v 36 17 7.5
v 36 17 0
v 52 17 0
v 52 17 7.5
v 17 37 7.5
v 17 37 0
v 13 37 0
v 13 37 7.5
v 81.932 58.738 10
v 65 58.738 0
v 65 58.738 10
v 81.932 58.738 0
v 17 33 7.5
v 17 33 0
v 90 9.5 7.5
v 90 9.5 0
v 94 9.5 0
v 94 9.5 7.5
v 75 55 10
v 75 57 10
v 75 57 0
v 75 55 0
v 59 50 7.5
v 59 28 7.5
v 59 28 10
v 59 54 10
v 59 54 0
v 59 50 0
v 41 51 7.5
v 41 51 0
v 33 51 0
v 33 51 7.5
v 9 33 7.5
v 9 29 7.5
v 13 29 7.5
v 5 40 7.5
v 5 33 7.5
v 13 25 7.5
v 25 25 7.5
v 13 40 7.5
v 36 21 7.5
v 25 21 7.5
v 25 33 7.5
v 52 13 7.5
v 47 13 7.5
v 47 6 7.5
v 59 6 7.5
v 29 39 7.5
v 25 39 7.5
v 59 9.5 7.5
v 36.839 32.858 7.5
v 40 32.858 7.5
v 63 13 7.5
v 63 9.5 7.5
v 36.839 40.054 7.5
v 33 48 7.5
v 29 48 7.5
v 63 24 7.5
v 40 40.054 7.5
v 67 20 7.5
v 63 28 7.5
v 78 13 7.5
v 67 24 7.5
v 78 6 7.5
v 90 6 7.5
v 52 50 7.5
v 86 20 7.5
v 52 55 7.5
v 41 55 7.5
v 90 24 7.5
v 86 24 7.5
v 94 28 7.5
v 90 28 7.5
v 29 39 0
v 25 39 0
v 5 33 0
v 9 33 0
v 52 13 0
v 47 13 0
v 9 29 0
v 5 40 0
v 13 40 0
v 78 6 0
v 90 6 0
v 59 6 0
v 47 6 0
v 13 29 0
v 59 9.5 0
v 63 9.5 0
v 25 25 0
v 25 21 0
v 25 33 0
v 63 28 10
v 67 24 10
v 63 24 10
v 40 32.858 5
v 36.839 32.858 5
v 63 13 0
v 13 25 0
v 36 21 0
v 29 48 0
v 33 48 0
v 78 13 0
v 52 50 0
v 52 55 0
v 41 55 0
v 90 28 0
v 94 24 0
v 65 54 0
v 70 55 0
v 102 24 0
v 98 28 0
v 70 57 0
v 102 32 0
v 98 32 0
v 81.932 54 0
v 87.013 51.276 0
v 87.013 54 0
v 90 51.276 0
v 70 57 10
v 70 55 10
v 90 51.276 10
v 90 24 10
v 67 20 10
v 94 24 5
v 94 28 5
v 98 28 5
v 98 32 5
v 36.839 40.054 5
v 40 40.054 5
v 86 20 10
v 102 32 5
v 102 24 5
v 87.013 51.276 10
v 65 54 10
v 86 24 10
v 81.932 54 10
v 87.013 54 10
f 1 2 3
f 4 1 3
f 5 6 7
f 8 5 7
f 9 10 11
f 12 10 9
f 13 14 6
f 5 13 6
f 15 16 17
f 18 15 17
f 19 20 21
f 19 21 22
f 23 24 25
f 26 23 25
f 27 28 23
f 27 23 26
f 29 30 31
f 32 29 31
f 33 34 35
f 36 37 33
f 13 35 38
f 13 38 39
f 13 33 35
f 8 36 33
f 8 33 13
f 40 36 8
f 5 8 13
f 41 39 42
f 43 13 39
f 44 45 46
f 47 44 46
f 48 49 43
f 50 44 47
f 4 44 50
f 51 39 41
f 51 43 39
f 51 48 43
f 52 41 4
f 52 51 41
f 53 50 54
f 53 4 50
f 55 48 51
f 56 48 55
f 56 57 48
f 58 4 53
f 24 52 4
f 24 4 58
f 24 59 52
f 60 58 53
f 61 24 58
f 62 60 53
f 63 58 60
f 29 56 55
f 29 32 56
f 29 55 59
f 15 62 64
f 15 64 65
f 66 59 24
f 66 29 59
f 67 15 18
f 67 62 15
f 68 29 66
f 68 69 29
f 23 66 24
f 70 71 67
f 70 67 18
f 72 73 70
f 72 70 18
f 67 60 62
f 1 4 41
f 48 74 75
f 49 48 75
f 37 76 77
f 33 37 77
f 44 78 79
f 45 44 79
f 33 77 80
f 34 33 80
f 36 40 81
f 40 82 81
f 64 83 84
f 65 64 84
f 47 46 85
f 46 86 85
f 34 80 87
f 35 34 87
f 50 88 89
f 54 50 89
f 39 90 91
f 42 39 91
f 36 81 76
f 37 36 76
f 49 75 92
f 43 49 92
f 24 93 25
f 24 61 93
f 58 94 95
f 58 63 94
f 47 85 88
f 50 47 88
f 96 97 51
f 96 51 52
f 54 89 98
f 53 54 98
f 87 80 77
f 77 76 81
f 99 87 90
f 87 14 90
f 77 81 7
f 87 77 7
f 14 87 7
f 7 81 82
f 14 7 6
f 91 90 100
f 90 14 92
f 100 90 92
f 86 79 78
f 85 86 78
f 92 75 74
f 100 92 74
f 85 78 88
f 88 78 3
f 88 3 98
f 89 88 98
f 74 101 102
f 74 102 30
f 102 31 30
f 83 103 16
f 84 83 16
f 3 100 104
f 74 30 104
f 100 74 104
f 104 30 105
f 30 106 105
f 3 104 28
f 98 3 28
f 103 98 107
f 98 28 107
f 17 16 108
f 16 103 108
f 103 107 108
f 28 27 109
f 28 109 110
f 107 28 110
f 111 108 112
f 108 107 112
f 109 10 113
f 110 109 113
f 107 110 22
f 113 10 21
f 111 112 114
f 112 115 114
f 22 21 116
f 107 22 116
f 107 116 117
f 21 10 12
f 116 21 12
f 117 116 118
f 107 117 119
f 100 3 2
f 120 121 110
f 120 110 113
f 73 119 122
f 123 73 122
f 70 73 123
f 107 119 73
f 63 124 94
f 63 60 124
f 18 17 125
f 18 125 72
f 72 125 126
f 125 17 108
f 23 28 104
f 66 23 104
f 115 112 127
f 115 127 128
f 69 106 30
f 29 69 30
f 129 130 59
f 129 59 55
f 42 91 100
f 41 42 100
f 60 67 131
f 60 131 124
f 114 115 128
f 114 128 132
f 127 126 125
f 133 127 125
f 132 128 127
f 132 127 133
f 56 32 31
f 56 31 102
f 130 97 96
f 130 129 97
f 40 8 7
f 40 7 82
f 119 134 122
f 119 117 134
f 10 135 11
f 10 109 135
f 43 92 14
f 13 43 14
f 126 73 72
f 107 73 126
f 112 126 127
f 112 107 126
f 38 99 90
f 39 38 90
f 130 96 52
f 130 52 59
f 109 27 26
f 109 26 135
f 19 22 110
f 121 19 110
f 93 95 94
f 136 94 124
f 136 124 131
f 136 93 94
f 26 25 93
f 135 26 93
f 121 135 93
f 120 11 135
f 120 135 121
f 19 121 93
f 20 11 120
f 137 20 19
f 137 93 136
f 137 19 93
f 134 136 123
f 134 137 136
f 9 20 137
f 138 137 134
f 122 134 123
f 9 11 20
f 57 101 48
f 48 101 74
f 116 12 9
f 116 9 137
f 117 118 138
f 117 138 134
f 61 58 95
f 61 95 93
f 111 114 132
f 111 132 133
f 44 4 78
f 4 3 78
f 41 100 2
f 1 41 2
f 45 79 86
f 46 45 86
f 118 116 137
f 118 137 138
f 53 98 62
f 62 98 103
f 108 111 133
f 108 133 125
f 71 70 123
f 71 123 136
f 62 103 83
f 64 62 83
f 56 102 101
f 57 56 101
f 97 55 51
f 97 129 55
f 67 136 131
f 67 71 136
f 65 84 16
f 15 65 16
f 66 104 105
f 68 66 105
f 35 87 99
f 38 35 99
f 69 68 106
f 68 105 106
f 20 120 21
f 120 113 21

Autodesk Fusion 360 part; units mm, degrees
sketch "elephant sketch" plane through (0, 0, 0) normal (0, 0, 1) x (1, 0, 0)
  line L0 (5, 40) -> (5, 33)
  line L1 (5, 33) -> (9, 33)
  line L2 (9, 33) -> (9, 29)
  line L3 (9, 29) -> (13, 29)
  line L4 (13, 29) -> (13, 25)
  line L5 (13, 25) -> (25, 25)
  line L6 (25, 25) -> (25, 21)
  line L7 (25, 21) -> (36, 21)
  line L8 (36, 21) -> (36, 17)
  line L9 (36, 17) -> (52, 17)
  line L10 (52, 17) -> (52, 13)
  line L11 (52, 13) -> (47, 13)
  line L12 (47, 13) -> (47, 6)
  line L13 (47, 6) -> (59, 6)
  line L14 (59, 6) -> (59, 9.5)
  line L15 (59, 9.5) -> (63, 9.5)
  line L16 (63, 9.5) -> (63, 13)
  line L17 (63, 13) -> (78, 13)
  line L18 (78, 13) -> (78, 6)
  line L19 (78, 6) -> (90, 6)
  line L20 (90, 6) -> (90, 9.5)
  line L21 (90, 9.5) -> (94, 9.5)
  line L22 (94, 9.5) -> (94, 28)
  line L23 (94, 28) -> (90, 28)
  line L24 (90, 28) -> (90, 24)
  line L25 (90, 24) -> (86, 24)
  line L26 (86, 24) -> (86, 20)
  line L27 (86, 20) -> (67, 20)
  line L28 (67, 20) -> (67, 24)
  line L29 (67, 24) -> (63, 24)
  line L30 (63, 24) -> (63, 28)
  line L31 (63, 28) -> (59, 28)
  line L32 (59, 28) -> (59, 50)
  line L33 (59, 50) -> (52, 50)
  line L34 (52, 50) -> (52, 55)
  line L35 (52, 55) -> (41, 55)
  line L36 (41, 55) -> (41, 51)
  line L37 (41, 51) -> (33, 51)
  line L38 (33, 51) -> (33, 48)
  line L39 (33, 48) -> (29, 48)
  line L40 (29, 48) -> (29, 39)
  line L41 (29, 39) -> (25, 39)
  line L42 (25, 39) -> (25, 33)
  line L43 (25, 33) -> (17, 33)
  line L44 (17, 33) -> (17, 37)
  line L45 (17, 37) -> (13, 37)
  line L46 (13, 37) -> (13, 40)
  line L47 (13, 40) -> (5, 40)
  line L48 (94, 28) -> (98, 28)
  line L49 (98, 28) -> (98, 32)
  line L50 (98, 32) -> (102, 32)
  line L51 (102, 32) -> (102, 24)
  line L52 (102, 24) -> (94, 24)
  line L53 (59, 50) -> (59, 54)
  line L54 (59, 54) -> (65, 54)
  line L55 (65, 54) -> (65, 58.7382)
  line L56 (65, 58.7382) -> (81.9319, 58.7382)
  line L57 (81.9319, 58.7382) -> (81.9319, 54)
  line L58 (81.9319, 54) -> (87.0128, 54)
  line L59 (87.0128, 54) -> (87.0128, 51.2757)
  line L60 (87.0128, 51.2757) -> (90, 51.2757)
  line L61 (90, 51.2757) -> (90, 28)
  line L62 (36.8391, 40.0538) -> (36.8391, 32.8575)
  line L63 (36.8391, 32.8575) -> (40, 32.8575)
  line L64 (40, 32.8575) -> (40, 40.0538)
  line L65 (40, 40.0538) -> (36.8391, 40.0538)
  line L66 (71, 57) -> (75, 57)
  line L67 (75, 57) -> (75, 55)
  line L68 (75, 55) -> (70, 55)
  line L69 (70, 55) -> (70, 57)
  line L70 (70, 57) -> (71, 57)
extrude "Extrude1" add sketch "elephant sketch" along normal blind 7.5 contours L0 L1 L2 L3 L4 L5 L6 L7 L8 L9 L10 L11 L12 L13 L14 L15 L16 L17 L18 L19 L20 L21 L22 L23 L24 L25 L26 L27 L28 L29 L30 L31 L32 L33 L34 L35 L36 L37 L38 L39 L40 L41 L42 L43 L44 L45 L46 L47
extrude "Extrude2" add sketch "elephant sketch" along normal blind 10 contours L24 L25 L26 L27 L28 L29 L30 L31 L32 L53 L54 L55 L56 L57 L58 L59 L60 L61 | L66 L67 L68 L69 L70
extrude "Extrude3" add sketch "elephant sketch" along normal blind 5 contours L22 L48 L49 L50 L51 L52
extrude "Extrude4" add sketch "elephant sketch" along normal blind 5 contours L62 L63 L64 L65
extrude "Extrude5" cut sketch "elephant sketch" along normal blind 13 contours L66 L67 L68 L69 L70
